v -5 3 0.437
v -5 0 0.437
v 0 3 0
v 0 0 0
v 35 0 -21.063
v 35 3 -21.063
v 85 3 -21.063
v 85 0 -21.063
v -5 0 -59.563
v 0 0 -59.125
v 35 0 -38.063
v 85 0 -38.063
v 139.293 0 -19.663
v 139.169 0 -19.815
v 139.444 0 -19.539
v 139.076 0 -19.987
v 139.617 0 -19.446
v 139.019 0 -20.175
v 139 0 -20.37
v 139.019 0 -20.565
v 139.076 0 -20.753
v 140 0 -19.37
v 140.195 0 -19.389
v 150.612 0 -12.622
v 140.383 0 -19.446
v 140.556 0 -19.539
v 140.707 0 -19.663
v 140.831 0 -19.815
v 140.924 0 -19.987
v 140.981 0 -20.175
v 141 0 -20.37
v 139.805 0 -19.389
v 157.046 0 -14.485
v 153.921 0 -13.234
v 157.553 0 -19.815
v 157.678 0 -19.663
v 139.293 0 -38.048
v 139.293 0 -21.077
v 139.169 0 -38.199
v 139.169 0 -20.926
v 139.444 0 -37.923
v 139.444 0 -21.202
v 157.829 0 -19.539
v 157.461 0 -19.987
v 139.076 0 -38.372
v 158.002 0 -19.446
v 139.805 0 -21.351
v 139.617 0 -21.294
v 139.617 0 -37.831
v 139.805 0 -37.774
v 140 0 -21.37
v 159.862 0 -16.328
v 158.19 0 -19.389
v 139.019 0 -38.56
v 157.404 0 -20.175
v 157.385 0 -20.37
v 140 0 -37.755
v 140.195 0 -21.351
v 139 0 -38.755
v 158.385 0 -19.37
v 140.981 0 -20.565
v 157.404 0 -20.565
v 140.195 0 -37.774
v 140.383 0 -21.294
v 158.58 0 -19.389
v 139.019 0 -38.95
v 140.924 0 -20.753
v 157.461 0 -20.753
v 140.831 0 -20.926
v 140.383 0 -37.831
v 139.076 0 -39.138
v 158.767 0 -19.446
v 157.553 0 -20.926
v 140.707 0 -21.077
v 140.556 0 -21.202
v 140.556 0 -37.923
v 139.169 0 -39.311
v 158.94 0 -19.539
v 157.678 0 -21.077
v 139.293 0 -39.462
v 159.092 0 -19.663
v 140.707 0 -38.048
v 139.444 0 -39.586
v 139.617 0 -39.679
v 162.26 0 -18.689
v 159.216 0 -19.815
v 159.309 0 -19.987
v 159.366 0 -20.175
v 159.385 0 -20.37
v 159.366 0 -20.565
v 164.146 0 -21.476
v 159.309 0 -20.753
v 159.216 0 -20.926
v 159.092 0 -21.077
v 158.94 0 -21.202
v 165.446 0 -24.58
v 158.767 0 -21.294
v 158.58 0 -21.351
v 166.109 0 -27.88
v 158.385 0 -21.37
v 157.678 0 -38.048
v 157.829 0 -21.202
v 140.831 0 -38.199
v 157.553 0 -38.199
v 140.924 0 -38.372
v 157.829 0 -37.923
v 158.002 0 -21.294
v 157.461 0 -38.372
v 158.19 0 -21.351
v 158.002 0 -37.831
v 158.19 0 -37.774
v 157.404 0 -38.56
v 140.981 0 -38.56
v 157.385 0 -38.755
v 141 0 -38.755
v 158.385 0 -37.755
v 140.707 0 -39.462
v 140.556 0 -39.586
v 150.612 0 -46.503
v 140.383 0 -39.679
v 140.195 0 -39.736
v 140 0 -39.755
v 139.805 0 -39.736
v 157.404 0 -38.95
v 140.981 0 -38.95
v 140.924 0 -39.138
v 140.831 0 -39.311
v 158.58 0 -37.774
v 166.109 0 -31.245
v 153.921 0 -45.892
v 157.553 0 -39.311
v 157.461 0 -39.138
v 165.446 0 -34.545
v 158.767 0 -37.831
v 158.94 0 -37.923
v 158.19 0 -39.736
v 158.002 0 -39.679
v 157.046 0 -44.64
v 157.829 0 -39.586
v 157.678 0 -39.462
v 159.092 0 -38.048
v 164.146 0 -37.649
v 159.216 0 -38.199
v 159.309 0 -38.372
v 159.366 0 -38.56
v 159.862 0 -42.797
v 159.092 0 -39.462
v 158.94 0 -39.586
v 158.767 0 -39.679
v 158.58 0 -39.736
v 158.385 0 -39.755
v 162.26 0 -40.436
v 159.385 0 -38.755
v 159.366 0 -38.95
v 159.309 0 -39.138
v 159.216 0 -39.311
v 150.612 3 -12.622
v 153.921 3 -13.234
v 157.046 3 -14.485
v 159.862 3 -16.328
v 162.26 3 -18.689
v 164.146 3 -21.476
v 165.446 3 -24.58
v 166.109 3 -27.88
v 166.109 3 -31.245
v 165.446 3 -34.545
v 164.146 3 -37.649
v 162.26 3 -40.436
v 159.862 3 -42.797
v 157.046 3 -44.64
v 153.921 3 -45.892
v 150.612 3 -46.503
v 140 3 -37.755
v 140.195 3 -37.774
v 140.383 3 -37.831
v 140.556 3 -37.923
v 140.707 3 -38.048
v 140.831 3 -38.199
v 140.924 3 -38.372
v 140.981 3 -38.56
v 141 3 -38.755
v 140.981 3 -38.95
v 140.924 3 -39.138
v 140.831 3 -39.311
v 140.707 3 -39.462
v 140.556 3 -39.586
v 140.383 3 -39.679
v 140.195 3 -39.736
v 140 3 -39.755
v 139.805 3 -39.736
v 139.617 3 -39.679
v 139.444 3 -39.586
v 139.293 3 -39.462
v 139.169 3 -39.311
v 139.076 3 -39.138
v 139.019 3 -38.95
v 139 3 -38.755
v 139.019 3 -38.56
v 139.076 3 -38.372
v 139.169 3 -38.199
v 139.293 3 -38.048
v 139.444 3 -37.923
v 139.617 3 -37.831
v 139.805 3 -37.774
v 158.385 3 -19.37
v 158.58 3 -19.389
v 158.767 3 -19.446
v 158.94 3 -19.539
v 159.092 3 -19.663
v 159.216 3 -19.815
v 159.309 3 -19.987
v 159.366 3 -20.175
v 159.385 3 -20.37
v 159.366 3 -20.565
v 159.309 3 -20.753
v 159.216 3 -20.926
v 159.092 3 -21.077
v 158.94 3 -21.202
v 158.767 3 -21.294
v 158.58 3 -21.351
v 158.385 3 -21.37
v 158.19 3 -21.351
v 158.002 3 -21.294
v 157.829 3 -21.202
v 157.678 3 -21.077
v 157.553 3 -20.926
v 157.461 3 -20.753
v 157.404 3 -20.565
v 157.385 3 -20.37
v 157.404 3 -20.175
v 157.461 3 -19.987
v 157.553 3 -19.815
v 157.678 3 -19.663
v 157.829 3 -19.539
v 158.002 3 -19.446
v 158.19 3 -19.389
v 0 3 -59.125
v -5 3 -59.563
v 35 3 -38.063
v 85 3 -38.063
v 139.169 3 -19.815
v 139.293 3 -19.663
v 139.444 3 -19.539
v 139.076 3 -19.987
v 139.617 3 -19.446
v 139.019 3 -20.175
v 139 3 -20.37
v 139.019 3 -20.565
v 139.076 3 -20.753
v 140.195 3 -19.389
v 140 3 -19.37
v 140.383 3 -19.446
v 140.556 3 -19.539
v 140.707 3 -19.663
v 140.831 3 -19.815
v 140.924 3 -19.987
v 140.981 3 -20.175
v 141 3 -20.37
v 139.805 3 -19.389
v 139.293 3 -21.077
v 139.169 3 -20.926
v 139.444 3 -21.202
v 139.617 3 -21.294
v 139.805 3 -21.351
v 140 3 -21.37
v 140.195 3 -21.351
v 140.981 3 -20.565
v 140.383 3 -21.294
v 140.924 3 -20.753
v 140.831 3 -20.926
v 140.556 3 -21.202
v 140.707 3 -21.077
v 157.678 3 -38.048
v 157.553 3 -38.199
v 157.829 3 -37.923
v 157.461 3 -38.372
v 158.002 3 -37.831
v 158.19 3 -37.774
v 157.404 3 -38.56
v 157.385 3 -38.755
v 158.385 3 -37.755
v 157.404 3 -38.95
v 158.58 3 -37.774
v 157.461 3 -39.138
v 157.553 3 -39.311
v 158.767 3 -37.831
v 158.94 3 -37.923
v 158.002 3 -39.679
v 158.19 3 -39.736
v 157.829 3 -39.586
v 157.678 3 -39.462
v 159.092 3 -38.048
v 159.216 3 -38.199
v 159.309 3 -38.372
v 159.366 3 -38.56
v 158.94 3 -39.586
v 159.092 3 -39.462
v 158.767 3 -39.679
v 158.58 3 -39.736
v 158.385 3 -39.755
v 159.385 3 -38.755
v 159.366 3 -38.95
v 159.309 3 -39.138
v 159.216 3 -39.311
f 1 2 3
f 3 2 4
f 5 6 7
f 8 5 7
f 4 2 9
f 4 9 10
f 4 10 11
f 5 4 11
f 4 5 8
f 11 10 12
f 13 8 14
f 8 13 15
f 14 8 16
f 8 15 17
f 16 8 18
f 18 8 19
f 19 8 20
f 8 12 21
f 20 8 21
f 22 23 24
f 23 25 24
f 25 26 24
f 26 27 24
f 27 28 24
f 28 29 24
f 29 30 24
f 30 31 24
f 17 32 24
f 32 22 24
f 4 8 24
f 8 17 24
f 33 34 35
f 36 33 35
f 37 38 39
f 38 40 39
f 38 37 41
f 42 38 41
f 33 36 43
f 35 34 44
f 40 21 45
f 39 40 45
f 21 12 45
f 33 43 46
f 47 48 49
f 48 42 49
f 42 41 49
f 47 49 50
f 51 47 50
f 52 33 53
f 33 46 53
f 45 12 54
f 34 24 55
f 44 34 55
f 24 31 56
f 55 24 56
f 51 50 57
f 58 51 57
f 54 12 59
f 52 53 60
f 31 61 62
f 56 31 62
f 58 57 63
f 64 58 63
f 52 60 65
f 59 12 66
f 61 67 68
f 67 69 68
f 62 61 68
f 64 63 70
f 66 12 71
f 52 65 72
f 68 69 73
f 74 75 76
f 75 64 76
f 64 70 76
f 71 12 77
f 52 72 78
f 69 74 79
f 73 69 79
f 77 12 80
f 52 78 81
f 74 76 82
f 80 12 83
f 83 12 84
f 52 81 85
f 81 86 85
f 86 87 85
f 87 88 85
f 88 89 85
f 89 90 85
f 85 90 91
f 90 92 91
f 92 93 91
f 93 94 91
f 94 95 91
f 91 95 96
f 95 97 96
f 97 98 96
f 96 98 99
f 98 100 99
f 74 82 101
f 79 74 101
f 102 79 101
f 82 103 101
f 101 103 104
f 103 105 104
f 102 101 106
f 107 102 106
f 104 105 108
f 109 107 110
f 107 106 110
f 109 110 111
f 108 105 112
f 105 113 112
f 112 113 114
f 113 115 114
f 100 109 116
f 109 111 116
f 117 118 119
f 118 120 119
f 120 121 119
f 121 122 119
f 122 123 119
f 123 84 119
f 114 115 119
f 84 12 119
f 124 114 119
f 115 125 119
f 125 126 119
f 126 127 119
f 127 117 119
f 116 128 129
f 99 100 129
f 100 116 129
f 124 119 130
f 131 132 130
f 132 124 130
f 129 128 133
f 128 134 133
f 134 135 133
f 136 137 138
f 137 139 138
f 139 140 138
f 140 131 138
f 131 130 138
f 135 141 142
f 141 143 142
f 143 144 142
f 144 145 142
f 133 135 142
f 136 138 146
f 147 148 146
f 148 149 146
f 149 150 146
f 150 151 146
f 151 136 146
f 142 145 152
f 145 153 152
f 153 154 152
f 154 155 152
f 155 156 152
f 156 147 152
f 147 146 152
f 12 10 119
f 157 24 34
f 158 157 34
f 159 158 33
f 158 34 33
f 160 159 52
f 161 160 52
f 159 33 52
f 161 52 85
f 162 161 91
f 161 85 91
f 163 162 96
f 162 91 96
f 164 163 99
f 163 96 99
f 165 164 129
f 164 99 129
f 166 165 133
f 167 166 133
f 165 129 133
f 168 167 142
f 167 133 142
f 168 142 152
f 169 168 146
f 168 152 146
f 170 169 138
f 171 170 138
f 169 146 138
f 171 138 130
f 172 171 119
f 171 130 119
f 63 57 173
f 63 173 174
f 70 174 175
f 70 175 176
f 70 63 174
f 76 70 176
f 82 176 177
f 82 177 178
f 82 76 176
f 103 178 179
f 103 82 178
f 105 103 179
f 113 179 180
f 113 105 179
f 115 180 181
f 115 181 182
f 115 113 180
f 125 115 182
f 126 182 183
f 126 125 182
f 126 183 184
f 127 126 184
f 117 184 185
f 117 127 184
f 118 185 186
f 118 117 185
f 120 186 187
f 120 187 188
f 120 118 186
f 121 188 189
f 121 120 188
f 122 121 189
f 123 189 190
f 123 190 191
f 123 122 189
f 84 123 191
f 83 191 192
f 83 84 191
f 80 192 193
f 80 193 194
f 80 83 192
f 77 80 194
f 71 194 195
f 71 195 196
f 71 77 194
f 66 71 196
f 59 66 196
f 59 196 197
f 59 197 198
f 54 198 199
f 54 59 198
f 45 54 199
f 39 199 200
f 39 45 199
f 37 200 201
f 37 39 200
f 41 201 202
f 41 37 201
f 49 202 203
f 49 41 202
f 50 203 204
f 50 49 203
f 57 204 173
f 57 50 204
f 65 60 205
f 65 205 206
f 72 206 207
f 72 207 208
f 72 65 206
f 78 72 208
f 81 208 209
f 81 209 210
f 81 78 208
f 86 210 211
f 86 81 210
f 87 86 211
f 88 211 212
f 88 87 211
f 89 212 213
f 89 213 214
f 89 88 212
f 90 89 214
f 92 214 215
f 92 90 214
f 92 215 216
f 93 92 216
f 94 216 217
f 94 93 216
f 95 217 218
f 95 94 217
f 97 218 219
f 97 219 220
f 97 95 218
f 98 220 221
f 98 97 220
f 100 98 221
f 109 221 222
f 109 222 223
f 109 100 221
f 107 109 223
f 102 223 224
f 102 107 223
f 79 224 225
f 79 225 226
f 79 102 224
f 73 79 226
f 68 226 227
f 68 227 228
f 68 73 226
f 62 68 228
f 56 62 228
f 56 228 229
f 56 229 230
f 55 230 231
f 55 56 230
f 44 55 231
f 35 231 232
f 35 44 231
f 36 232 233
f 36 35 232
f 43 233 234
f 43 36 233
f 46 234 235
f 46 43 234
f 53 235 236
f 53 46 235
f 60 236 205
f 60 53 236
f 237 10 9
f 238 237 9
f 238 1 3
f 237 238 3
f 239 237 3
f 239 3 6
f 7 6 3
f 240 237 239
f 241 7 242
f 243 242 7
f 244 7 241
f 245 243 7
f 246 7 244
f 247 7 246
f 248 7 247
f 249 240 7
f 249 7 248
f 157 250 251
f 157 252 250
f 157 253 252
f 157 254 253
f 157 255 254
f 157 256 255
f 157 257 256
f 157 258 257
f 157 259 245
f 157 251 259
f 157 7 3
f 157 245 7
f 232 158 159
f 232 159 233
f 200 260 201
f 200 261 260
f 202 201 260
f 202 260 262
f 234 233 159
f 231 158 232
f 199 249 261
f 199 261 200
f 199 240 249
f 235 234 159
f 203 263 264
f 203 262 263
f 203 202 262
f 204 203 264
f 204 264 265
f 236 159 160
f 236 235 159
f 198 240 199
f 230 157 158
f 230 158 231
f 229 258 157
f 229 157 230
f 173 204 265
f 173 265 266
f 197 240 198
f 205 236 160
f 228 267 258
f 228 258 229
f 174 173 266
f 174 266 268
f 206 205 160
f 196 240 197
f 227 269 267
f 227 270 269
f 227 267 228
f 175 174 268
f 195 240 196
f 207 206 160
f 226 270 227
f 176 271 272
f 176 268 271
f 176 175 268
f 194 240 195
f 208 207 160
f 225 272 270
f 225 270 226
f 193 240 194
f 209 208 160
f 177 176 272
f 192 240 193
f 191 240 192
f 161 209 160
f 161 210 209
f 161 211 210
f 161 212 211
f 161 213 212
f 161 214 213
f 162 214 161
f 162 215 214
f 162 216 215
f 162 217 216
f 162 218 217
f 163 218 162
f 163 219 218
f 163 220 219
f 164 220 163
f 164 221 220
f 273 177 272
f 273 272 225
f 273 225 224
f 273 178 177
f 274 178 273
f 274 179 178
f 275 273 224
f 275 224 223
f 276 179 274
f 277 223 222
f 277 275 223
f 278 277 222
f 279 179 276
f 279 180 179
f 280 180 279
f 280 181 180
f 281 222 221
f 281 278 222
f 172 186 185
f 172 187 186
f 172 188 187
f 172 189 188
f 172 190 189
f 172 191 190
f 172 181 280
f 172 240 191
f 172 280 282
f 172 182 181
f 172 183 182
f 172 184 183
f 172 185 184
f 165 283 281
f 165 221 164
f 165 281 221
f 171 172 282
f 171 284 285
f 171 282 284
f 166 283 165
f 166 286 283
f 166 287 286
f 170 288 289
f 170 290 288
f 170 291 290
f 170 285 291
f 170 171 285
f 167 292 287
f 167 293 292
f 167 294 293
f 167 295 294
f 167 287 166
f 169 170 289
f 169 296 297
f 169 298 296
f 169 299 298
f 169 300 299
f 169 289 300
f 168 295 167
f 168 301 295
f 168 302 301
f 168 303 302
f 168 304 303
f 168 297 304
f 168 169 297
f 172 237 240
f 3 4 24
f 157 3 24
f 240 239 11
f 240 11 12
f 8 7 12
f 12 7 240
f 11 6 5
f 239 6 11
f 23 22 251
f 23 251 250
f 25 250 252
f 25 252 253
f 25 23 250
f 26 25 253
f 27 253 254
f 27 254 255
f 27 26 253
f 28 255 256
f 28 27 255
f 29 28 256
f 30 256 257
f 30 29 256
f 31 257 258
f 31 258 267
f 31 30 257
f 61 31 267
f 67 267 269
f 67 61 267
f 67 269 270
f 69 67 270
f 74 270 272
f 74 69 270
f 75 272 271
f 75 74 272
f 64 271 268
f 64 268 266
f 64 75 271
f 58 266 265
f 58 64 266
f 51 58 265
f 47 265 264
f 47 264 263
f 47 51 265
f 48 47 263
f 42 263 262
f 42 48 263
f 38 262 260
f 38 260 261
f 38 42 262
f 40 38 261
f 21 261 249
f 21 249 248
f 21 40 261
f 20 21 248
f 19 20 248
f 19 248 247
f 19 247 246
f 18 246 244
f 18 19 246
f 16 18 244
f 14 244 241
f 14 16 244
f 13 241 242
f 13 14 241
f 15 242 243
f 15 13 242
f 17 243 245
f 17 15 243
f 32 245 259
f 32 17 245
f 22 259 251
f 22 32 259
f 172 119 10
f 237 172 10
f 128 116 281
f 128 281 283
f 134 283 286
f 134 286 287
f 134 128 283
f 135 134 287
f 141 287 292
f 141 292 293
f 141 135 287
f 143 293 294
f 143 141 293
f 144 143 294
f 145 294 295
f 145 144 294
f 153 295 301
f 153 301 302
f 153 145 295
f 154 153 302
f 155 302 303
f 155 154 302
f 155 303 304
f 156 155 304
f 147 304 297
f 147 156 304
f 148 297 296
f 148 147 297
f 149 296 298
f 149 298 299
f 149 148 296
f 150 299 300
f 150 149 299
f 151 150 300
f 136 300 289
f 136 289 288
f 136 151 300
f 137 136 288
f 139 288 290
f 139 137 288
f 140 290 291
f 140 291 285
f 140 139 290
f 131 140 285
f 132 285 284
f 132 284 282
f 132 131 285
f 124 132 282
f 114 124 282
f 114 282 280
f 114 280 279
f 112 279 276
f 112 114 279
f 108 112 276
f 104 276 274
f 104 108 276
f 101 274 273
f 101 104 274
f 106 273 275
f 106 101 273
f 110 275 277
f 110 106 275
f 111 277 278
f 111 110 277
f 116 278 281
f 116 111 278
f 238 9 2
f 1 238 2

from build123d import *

# Parameters (mm, degrees)
SKETCH1_R           = 1
BOSS_EXTRUDE1_DEPTH = 3
SKETCH2_W           = 50
SKETCH2_H           = 17
CUT_EXTRUDE1_DEPTH  = 177.568989461


with BuildPart() as part:
    # Sketch1 → Boss-Extrude1 (new body)
    with BuildSketch(Plane(origin=(0, 0, 0), x_dir=(1, 0, 0), z_dir=(0, 1, 0))):
        with BuildLine():
            Line((0, 0), (150.612084668, 12.621940938))
            ThreePointArc((150.612084668, 12.621940938), (166.192388155, 29.562556682), (150.612084668, 46.503172427))
            Line((150.612084668, 46.503172427), (0, 59.125113365))
            Line((0, 59.125113365), (-5, 59.562556682))
            Line((-5, 59.562556682), (-5, -0.437443318))
            Line((-5, -0.437443318), (0, 0))
        make_face()
        with Locations(Location((140, 38.754944838, 0), (0, 0, 270))):
            Circle(SKETCH1_R, mode=Mode.SUBTRACT)
        with Locations(Location((140, 20.370168527, 0), (0, 0, 270))):
            Circle(SKETCH1_R, mode=Mode.SUBTRACT)
        with Locations(Location((158.384776311, 20.370168527, 0), (0, 0, 270))):
            Circle(SKETCH1_R, mode=Mode.SUBTRACT)
        with Locations(Location((158.384776311, 38.754944838, 0), (0, 0, 270))):
            Circle(SKETCH1_R, mode=Mode.SUBTRACT)
    extrude(amount=BOSS_EXTRUDE1_DEPTH)

    # Sketch2 → Cut-Extrude1 (cut, through all)
    with BuildSketch(Plane(origin=(0, 3, 0), x_dir=(1, 0, 0), z_dir=(0, 1, 0))):
        with Locations((60, 29.562556682)):
            Rectangle(SKETCH2_W, SKETCH2_H)
    extrude(amount=-CUT_EXTRUDE1_DEPTH, mode=Mode.SUBTRACT)


solid = part.part
